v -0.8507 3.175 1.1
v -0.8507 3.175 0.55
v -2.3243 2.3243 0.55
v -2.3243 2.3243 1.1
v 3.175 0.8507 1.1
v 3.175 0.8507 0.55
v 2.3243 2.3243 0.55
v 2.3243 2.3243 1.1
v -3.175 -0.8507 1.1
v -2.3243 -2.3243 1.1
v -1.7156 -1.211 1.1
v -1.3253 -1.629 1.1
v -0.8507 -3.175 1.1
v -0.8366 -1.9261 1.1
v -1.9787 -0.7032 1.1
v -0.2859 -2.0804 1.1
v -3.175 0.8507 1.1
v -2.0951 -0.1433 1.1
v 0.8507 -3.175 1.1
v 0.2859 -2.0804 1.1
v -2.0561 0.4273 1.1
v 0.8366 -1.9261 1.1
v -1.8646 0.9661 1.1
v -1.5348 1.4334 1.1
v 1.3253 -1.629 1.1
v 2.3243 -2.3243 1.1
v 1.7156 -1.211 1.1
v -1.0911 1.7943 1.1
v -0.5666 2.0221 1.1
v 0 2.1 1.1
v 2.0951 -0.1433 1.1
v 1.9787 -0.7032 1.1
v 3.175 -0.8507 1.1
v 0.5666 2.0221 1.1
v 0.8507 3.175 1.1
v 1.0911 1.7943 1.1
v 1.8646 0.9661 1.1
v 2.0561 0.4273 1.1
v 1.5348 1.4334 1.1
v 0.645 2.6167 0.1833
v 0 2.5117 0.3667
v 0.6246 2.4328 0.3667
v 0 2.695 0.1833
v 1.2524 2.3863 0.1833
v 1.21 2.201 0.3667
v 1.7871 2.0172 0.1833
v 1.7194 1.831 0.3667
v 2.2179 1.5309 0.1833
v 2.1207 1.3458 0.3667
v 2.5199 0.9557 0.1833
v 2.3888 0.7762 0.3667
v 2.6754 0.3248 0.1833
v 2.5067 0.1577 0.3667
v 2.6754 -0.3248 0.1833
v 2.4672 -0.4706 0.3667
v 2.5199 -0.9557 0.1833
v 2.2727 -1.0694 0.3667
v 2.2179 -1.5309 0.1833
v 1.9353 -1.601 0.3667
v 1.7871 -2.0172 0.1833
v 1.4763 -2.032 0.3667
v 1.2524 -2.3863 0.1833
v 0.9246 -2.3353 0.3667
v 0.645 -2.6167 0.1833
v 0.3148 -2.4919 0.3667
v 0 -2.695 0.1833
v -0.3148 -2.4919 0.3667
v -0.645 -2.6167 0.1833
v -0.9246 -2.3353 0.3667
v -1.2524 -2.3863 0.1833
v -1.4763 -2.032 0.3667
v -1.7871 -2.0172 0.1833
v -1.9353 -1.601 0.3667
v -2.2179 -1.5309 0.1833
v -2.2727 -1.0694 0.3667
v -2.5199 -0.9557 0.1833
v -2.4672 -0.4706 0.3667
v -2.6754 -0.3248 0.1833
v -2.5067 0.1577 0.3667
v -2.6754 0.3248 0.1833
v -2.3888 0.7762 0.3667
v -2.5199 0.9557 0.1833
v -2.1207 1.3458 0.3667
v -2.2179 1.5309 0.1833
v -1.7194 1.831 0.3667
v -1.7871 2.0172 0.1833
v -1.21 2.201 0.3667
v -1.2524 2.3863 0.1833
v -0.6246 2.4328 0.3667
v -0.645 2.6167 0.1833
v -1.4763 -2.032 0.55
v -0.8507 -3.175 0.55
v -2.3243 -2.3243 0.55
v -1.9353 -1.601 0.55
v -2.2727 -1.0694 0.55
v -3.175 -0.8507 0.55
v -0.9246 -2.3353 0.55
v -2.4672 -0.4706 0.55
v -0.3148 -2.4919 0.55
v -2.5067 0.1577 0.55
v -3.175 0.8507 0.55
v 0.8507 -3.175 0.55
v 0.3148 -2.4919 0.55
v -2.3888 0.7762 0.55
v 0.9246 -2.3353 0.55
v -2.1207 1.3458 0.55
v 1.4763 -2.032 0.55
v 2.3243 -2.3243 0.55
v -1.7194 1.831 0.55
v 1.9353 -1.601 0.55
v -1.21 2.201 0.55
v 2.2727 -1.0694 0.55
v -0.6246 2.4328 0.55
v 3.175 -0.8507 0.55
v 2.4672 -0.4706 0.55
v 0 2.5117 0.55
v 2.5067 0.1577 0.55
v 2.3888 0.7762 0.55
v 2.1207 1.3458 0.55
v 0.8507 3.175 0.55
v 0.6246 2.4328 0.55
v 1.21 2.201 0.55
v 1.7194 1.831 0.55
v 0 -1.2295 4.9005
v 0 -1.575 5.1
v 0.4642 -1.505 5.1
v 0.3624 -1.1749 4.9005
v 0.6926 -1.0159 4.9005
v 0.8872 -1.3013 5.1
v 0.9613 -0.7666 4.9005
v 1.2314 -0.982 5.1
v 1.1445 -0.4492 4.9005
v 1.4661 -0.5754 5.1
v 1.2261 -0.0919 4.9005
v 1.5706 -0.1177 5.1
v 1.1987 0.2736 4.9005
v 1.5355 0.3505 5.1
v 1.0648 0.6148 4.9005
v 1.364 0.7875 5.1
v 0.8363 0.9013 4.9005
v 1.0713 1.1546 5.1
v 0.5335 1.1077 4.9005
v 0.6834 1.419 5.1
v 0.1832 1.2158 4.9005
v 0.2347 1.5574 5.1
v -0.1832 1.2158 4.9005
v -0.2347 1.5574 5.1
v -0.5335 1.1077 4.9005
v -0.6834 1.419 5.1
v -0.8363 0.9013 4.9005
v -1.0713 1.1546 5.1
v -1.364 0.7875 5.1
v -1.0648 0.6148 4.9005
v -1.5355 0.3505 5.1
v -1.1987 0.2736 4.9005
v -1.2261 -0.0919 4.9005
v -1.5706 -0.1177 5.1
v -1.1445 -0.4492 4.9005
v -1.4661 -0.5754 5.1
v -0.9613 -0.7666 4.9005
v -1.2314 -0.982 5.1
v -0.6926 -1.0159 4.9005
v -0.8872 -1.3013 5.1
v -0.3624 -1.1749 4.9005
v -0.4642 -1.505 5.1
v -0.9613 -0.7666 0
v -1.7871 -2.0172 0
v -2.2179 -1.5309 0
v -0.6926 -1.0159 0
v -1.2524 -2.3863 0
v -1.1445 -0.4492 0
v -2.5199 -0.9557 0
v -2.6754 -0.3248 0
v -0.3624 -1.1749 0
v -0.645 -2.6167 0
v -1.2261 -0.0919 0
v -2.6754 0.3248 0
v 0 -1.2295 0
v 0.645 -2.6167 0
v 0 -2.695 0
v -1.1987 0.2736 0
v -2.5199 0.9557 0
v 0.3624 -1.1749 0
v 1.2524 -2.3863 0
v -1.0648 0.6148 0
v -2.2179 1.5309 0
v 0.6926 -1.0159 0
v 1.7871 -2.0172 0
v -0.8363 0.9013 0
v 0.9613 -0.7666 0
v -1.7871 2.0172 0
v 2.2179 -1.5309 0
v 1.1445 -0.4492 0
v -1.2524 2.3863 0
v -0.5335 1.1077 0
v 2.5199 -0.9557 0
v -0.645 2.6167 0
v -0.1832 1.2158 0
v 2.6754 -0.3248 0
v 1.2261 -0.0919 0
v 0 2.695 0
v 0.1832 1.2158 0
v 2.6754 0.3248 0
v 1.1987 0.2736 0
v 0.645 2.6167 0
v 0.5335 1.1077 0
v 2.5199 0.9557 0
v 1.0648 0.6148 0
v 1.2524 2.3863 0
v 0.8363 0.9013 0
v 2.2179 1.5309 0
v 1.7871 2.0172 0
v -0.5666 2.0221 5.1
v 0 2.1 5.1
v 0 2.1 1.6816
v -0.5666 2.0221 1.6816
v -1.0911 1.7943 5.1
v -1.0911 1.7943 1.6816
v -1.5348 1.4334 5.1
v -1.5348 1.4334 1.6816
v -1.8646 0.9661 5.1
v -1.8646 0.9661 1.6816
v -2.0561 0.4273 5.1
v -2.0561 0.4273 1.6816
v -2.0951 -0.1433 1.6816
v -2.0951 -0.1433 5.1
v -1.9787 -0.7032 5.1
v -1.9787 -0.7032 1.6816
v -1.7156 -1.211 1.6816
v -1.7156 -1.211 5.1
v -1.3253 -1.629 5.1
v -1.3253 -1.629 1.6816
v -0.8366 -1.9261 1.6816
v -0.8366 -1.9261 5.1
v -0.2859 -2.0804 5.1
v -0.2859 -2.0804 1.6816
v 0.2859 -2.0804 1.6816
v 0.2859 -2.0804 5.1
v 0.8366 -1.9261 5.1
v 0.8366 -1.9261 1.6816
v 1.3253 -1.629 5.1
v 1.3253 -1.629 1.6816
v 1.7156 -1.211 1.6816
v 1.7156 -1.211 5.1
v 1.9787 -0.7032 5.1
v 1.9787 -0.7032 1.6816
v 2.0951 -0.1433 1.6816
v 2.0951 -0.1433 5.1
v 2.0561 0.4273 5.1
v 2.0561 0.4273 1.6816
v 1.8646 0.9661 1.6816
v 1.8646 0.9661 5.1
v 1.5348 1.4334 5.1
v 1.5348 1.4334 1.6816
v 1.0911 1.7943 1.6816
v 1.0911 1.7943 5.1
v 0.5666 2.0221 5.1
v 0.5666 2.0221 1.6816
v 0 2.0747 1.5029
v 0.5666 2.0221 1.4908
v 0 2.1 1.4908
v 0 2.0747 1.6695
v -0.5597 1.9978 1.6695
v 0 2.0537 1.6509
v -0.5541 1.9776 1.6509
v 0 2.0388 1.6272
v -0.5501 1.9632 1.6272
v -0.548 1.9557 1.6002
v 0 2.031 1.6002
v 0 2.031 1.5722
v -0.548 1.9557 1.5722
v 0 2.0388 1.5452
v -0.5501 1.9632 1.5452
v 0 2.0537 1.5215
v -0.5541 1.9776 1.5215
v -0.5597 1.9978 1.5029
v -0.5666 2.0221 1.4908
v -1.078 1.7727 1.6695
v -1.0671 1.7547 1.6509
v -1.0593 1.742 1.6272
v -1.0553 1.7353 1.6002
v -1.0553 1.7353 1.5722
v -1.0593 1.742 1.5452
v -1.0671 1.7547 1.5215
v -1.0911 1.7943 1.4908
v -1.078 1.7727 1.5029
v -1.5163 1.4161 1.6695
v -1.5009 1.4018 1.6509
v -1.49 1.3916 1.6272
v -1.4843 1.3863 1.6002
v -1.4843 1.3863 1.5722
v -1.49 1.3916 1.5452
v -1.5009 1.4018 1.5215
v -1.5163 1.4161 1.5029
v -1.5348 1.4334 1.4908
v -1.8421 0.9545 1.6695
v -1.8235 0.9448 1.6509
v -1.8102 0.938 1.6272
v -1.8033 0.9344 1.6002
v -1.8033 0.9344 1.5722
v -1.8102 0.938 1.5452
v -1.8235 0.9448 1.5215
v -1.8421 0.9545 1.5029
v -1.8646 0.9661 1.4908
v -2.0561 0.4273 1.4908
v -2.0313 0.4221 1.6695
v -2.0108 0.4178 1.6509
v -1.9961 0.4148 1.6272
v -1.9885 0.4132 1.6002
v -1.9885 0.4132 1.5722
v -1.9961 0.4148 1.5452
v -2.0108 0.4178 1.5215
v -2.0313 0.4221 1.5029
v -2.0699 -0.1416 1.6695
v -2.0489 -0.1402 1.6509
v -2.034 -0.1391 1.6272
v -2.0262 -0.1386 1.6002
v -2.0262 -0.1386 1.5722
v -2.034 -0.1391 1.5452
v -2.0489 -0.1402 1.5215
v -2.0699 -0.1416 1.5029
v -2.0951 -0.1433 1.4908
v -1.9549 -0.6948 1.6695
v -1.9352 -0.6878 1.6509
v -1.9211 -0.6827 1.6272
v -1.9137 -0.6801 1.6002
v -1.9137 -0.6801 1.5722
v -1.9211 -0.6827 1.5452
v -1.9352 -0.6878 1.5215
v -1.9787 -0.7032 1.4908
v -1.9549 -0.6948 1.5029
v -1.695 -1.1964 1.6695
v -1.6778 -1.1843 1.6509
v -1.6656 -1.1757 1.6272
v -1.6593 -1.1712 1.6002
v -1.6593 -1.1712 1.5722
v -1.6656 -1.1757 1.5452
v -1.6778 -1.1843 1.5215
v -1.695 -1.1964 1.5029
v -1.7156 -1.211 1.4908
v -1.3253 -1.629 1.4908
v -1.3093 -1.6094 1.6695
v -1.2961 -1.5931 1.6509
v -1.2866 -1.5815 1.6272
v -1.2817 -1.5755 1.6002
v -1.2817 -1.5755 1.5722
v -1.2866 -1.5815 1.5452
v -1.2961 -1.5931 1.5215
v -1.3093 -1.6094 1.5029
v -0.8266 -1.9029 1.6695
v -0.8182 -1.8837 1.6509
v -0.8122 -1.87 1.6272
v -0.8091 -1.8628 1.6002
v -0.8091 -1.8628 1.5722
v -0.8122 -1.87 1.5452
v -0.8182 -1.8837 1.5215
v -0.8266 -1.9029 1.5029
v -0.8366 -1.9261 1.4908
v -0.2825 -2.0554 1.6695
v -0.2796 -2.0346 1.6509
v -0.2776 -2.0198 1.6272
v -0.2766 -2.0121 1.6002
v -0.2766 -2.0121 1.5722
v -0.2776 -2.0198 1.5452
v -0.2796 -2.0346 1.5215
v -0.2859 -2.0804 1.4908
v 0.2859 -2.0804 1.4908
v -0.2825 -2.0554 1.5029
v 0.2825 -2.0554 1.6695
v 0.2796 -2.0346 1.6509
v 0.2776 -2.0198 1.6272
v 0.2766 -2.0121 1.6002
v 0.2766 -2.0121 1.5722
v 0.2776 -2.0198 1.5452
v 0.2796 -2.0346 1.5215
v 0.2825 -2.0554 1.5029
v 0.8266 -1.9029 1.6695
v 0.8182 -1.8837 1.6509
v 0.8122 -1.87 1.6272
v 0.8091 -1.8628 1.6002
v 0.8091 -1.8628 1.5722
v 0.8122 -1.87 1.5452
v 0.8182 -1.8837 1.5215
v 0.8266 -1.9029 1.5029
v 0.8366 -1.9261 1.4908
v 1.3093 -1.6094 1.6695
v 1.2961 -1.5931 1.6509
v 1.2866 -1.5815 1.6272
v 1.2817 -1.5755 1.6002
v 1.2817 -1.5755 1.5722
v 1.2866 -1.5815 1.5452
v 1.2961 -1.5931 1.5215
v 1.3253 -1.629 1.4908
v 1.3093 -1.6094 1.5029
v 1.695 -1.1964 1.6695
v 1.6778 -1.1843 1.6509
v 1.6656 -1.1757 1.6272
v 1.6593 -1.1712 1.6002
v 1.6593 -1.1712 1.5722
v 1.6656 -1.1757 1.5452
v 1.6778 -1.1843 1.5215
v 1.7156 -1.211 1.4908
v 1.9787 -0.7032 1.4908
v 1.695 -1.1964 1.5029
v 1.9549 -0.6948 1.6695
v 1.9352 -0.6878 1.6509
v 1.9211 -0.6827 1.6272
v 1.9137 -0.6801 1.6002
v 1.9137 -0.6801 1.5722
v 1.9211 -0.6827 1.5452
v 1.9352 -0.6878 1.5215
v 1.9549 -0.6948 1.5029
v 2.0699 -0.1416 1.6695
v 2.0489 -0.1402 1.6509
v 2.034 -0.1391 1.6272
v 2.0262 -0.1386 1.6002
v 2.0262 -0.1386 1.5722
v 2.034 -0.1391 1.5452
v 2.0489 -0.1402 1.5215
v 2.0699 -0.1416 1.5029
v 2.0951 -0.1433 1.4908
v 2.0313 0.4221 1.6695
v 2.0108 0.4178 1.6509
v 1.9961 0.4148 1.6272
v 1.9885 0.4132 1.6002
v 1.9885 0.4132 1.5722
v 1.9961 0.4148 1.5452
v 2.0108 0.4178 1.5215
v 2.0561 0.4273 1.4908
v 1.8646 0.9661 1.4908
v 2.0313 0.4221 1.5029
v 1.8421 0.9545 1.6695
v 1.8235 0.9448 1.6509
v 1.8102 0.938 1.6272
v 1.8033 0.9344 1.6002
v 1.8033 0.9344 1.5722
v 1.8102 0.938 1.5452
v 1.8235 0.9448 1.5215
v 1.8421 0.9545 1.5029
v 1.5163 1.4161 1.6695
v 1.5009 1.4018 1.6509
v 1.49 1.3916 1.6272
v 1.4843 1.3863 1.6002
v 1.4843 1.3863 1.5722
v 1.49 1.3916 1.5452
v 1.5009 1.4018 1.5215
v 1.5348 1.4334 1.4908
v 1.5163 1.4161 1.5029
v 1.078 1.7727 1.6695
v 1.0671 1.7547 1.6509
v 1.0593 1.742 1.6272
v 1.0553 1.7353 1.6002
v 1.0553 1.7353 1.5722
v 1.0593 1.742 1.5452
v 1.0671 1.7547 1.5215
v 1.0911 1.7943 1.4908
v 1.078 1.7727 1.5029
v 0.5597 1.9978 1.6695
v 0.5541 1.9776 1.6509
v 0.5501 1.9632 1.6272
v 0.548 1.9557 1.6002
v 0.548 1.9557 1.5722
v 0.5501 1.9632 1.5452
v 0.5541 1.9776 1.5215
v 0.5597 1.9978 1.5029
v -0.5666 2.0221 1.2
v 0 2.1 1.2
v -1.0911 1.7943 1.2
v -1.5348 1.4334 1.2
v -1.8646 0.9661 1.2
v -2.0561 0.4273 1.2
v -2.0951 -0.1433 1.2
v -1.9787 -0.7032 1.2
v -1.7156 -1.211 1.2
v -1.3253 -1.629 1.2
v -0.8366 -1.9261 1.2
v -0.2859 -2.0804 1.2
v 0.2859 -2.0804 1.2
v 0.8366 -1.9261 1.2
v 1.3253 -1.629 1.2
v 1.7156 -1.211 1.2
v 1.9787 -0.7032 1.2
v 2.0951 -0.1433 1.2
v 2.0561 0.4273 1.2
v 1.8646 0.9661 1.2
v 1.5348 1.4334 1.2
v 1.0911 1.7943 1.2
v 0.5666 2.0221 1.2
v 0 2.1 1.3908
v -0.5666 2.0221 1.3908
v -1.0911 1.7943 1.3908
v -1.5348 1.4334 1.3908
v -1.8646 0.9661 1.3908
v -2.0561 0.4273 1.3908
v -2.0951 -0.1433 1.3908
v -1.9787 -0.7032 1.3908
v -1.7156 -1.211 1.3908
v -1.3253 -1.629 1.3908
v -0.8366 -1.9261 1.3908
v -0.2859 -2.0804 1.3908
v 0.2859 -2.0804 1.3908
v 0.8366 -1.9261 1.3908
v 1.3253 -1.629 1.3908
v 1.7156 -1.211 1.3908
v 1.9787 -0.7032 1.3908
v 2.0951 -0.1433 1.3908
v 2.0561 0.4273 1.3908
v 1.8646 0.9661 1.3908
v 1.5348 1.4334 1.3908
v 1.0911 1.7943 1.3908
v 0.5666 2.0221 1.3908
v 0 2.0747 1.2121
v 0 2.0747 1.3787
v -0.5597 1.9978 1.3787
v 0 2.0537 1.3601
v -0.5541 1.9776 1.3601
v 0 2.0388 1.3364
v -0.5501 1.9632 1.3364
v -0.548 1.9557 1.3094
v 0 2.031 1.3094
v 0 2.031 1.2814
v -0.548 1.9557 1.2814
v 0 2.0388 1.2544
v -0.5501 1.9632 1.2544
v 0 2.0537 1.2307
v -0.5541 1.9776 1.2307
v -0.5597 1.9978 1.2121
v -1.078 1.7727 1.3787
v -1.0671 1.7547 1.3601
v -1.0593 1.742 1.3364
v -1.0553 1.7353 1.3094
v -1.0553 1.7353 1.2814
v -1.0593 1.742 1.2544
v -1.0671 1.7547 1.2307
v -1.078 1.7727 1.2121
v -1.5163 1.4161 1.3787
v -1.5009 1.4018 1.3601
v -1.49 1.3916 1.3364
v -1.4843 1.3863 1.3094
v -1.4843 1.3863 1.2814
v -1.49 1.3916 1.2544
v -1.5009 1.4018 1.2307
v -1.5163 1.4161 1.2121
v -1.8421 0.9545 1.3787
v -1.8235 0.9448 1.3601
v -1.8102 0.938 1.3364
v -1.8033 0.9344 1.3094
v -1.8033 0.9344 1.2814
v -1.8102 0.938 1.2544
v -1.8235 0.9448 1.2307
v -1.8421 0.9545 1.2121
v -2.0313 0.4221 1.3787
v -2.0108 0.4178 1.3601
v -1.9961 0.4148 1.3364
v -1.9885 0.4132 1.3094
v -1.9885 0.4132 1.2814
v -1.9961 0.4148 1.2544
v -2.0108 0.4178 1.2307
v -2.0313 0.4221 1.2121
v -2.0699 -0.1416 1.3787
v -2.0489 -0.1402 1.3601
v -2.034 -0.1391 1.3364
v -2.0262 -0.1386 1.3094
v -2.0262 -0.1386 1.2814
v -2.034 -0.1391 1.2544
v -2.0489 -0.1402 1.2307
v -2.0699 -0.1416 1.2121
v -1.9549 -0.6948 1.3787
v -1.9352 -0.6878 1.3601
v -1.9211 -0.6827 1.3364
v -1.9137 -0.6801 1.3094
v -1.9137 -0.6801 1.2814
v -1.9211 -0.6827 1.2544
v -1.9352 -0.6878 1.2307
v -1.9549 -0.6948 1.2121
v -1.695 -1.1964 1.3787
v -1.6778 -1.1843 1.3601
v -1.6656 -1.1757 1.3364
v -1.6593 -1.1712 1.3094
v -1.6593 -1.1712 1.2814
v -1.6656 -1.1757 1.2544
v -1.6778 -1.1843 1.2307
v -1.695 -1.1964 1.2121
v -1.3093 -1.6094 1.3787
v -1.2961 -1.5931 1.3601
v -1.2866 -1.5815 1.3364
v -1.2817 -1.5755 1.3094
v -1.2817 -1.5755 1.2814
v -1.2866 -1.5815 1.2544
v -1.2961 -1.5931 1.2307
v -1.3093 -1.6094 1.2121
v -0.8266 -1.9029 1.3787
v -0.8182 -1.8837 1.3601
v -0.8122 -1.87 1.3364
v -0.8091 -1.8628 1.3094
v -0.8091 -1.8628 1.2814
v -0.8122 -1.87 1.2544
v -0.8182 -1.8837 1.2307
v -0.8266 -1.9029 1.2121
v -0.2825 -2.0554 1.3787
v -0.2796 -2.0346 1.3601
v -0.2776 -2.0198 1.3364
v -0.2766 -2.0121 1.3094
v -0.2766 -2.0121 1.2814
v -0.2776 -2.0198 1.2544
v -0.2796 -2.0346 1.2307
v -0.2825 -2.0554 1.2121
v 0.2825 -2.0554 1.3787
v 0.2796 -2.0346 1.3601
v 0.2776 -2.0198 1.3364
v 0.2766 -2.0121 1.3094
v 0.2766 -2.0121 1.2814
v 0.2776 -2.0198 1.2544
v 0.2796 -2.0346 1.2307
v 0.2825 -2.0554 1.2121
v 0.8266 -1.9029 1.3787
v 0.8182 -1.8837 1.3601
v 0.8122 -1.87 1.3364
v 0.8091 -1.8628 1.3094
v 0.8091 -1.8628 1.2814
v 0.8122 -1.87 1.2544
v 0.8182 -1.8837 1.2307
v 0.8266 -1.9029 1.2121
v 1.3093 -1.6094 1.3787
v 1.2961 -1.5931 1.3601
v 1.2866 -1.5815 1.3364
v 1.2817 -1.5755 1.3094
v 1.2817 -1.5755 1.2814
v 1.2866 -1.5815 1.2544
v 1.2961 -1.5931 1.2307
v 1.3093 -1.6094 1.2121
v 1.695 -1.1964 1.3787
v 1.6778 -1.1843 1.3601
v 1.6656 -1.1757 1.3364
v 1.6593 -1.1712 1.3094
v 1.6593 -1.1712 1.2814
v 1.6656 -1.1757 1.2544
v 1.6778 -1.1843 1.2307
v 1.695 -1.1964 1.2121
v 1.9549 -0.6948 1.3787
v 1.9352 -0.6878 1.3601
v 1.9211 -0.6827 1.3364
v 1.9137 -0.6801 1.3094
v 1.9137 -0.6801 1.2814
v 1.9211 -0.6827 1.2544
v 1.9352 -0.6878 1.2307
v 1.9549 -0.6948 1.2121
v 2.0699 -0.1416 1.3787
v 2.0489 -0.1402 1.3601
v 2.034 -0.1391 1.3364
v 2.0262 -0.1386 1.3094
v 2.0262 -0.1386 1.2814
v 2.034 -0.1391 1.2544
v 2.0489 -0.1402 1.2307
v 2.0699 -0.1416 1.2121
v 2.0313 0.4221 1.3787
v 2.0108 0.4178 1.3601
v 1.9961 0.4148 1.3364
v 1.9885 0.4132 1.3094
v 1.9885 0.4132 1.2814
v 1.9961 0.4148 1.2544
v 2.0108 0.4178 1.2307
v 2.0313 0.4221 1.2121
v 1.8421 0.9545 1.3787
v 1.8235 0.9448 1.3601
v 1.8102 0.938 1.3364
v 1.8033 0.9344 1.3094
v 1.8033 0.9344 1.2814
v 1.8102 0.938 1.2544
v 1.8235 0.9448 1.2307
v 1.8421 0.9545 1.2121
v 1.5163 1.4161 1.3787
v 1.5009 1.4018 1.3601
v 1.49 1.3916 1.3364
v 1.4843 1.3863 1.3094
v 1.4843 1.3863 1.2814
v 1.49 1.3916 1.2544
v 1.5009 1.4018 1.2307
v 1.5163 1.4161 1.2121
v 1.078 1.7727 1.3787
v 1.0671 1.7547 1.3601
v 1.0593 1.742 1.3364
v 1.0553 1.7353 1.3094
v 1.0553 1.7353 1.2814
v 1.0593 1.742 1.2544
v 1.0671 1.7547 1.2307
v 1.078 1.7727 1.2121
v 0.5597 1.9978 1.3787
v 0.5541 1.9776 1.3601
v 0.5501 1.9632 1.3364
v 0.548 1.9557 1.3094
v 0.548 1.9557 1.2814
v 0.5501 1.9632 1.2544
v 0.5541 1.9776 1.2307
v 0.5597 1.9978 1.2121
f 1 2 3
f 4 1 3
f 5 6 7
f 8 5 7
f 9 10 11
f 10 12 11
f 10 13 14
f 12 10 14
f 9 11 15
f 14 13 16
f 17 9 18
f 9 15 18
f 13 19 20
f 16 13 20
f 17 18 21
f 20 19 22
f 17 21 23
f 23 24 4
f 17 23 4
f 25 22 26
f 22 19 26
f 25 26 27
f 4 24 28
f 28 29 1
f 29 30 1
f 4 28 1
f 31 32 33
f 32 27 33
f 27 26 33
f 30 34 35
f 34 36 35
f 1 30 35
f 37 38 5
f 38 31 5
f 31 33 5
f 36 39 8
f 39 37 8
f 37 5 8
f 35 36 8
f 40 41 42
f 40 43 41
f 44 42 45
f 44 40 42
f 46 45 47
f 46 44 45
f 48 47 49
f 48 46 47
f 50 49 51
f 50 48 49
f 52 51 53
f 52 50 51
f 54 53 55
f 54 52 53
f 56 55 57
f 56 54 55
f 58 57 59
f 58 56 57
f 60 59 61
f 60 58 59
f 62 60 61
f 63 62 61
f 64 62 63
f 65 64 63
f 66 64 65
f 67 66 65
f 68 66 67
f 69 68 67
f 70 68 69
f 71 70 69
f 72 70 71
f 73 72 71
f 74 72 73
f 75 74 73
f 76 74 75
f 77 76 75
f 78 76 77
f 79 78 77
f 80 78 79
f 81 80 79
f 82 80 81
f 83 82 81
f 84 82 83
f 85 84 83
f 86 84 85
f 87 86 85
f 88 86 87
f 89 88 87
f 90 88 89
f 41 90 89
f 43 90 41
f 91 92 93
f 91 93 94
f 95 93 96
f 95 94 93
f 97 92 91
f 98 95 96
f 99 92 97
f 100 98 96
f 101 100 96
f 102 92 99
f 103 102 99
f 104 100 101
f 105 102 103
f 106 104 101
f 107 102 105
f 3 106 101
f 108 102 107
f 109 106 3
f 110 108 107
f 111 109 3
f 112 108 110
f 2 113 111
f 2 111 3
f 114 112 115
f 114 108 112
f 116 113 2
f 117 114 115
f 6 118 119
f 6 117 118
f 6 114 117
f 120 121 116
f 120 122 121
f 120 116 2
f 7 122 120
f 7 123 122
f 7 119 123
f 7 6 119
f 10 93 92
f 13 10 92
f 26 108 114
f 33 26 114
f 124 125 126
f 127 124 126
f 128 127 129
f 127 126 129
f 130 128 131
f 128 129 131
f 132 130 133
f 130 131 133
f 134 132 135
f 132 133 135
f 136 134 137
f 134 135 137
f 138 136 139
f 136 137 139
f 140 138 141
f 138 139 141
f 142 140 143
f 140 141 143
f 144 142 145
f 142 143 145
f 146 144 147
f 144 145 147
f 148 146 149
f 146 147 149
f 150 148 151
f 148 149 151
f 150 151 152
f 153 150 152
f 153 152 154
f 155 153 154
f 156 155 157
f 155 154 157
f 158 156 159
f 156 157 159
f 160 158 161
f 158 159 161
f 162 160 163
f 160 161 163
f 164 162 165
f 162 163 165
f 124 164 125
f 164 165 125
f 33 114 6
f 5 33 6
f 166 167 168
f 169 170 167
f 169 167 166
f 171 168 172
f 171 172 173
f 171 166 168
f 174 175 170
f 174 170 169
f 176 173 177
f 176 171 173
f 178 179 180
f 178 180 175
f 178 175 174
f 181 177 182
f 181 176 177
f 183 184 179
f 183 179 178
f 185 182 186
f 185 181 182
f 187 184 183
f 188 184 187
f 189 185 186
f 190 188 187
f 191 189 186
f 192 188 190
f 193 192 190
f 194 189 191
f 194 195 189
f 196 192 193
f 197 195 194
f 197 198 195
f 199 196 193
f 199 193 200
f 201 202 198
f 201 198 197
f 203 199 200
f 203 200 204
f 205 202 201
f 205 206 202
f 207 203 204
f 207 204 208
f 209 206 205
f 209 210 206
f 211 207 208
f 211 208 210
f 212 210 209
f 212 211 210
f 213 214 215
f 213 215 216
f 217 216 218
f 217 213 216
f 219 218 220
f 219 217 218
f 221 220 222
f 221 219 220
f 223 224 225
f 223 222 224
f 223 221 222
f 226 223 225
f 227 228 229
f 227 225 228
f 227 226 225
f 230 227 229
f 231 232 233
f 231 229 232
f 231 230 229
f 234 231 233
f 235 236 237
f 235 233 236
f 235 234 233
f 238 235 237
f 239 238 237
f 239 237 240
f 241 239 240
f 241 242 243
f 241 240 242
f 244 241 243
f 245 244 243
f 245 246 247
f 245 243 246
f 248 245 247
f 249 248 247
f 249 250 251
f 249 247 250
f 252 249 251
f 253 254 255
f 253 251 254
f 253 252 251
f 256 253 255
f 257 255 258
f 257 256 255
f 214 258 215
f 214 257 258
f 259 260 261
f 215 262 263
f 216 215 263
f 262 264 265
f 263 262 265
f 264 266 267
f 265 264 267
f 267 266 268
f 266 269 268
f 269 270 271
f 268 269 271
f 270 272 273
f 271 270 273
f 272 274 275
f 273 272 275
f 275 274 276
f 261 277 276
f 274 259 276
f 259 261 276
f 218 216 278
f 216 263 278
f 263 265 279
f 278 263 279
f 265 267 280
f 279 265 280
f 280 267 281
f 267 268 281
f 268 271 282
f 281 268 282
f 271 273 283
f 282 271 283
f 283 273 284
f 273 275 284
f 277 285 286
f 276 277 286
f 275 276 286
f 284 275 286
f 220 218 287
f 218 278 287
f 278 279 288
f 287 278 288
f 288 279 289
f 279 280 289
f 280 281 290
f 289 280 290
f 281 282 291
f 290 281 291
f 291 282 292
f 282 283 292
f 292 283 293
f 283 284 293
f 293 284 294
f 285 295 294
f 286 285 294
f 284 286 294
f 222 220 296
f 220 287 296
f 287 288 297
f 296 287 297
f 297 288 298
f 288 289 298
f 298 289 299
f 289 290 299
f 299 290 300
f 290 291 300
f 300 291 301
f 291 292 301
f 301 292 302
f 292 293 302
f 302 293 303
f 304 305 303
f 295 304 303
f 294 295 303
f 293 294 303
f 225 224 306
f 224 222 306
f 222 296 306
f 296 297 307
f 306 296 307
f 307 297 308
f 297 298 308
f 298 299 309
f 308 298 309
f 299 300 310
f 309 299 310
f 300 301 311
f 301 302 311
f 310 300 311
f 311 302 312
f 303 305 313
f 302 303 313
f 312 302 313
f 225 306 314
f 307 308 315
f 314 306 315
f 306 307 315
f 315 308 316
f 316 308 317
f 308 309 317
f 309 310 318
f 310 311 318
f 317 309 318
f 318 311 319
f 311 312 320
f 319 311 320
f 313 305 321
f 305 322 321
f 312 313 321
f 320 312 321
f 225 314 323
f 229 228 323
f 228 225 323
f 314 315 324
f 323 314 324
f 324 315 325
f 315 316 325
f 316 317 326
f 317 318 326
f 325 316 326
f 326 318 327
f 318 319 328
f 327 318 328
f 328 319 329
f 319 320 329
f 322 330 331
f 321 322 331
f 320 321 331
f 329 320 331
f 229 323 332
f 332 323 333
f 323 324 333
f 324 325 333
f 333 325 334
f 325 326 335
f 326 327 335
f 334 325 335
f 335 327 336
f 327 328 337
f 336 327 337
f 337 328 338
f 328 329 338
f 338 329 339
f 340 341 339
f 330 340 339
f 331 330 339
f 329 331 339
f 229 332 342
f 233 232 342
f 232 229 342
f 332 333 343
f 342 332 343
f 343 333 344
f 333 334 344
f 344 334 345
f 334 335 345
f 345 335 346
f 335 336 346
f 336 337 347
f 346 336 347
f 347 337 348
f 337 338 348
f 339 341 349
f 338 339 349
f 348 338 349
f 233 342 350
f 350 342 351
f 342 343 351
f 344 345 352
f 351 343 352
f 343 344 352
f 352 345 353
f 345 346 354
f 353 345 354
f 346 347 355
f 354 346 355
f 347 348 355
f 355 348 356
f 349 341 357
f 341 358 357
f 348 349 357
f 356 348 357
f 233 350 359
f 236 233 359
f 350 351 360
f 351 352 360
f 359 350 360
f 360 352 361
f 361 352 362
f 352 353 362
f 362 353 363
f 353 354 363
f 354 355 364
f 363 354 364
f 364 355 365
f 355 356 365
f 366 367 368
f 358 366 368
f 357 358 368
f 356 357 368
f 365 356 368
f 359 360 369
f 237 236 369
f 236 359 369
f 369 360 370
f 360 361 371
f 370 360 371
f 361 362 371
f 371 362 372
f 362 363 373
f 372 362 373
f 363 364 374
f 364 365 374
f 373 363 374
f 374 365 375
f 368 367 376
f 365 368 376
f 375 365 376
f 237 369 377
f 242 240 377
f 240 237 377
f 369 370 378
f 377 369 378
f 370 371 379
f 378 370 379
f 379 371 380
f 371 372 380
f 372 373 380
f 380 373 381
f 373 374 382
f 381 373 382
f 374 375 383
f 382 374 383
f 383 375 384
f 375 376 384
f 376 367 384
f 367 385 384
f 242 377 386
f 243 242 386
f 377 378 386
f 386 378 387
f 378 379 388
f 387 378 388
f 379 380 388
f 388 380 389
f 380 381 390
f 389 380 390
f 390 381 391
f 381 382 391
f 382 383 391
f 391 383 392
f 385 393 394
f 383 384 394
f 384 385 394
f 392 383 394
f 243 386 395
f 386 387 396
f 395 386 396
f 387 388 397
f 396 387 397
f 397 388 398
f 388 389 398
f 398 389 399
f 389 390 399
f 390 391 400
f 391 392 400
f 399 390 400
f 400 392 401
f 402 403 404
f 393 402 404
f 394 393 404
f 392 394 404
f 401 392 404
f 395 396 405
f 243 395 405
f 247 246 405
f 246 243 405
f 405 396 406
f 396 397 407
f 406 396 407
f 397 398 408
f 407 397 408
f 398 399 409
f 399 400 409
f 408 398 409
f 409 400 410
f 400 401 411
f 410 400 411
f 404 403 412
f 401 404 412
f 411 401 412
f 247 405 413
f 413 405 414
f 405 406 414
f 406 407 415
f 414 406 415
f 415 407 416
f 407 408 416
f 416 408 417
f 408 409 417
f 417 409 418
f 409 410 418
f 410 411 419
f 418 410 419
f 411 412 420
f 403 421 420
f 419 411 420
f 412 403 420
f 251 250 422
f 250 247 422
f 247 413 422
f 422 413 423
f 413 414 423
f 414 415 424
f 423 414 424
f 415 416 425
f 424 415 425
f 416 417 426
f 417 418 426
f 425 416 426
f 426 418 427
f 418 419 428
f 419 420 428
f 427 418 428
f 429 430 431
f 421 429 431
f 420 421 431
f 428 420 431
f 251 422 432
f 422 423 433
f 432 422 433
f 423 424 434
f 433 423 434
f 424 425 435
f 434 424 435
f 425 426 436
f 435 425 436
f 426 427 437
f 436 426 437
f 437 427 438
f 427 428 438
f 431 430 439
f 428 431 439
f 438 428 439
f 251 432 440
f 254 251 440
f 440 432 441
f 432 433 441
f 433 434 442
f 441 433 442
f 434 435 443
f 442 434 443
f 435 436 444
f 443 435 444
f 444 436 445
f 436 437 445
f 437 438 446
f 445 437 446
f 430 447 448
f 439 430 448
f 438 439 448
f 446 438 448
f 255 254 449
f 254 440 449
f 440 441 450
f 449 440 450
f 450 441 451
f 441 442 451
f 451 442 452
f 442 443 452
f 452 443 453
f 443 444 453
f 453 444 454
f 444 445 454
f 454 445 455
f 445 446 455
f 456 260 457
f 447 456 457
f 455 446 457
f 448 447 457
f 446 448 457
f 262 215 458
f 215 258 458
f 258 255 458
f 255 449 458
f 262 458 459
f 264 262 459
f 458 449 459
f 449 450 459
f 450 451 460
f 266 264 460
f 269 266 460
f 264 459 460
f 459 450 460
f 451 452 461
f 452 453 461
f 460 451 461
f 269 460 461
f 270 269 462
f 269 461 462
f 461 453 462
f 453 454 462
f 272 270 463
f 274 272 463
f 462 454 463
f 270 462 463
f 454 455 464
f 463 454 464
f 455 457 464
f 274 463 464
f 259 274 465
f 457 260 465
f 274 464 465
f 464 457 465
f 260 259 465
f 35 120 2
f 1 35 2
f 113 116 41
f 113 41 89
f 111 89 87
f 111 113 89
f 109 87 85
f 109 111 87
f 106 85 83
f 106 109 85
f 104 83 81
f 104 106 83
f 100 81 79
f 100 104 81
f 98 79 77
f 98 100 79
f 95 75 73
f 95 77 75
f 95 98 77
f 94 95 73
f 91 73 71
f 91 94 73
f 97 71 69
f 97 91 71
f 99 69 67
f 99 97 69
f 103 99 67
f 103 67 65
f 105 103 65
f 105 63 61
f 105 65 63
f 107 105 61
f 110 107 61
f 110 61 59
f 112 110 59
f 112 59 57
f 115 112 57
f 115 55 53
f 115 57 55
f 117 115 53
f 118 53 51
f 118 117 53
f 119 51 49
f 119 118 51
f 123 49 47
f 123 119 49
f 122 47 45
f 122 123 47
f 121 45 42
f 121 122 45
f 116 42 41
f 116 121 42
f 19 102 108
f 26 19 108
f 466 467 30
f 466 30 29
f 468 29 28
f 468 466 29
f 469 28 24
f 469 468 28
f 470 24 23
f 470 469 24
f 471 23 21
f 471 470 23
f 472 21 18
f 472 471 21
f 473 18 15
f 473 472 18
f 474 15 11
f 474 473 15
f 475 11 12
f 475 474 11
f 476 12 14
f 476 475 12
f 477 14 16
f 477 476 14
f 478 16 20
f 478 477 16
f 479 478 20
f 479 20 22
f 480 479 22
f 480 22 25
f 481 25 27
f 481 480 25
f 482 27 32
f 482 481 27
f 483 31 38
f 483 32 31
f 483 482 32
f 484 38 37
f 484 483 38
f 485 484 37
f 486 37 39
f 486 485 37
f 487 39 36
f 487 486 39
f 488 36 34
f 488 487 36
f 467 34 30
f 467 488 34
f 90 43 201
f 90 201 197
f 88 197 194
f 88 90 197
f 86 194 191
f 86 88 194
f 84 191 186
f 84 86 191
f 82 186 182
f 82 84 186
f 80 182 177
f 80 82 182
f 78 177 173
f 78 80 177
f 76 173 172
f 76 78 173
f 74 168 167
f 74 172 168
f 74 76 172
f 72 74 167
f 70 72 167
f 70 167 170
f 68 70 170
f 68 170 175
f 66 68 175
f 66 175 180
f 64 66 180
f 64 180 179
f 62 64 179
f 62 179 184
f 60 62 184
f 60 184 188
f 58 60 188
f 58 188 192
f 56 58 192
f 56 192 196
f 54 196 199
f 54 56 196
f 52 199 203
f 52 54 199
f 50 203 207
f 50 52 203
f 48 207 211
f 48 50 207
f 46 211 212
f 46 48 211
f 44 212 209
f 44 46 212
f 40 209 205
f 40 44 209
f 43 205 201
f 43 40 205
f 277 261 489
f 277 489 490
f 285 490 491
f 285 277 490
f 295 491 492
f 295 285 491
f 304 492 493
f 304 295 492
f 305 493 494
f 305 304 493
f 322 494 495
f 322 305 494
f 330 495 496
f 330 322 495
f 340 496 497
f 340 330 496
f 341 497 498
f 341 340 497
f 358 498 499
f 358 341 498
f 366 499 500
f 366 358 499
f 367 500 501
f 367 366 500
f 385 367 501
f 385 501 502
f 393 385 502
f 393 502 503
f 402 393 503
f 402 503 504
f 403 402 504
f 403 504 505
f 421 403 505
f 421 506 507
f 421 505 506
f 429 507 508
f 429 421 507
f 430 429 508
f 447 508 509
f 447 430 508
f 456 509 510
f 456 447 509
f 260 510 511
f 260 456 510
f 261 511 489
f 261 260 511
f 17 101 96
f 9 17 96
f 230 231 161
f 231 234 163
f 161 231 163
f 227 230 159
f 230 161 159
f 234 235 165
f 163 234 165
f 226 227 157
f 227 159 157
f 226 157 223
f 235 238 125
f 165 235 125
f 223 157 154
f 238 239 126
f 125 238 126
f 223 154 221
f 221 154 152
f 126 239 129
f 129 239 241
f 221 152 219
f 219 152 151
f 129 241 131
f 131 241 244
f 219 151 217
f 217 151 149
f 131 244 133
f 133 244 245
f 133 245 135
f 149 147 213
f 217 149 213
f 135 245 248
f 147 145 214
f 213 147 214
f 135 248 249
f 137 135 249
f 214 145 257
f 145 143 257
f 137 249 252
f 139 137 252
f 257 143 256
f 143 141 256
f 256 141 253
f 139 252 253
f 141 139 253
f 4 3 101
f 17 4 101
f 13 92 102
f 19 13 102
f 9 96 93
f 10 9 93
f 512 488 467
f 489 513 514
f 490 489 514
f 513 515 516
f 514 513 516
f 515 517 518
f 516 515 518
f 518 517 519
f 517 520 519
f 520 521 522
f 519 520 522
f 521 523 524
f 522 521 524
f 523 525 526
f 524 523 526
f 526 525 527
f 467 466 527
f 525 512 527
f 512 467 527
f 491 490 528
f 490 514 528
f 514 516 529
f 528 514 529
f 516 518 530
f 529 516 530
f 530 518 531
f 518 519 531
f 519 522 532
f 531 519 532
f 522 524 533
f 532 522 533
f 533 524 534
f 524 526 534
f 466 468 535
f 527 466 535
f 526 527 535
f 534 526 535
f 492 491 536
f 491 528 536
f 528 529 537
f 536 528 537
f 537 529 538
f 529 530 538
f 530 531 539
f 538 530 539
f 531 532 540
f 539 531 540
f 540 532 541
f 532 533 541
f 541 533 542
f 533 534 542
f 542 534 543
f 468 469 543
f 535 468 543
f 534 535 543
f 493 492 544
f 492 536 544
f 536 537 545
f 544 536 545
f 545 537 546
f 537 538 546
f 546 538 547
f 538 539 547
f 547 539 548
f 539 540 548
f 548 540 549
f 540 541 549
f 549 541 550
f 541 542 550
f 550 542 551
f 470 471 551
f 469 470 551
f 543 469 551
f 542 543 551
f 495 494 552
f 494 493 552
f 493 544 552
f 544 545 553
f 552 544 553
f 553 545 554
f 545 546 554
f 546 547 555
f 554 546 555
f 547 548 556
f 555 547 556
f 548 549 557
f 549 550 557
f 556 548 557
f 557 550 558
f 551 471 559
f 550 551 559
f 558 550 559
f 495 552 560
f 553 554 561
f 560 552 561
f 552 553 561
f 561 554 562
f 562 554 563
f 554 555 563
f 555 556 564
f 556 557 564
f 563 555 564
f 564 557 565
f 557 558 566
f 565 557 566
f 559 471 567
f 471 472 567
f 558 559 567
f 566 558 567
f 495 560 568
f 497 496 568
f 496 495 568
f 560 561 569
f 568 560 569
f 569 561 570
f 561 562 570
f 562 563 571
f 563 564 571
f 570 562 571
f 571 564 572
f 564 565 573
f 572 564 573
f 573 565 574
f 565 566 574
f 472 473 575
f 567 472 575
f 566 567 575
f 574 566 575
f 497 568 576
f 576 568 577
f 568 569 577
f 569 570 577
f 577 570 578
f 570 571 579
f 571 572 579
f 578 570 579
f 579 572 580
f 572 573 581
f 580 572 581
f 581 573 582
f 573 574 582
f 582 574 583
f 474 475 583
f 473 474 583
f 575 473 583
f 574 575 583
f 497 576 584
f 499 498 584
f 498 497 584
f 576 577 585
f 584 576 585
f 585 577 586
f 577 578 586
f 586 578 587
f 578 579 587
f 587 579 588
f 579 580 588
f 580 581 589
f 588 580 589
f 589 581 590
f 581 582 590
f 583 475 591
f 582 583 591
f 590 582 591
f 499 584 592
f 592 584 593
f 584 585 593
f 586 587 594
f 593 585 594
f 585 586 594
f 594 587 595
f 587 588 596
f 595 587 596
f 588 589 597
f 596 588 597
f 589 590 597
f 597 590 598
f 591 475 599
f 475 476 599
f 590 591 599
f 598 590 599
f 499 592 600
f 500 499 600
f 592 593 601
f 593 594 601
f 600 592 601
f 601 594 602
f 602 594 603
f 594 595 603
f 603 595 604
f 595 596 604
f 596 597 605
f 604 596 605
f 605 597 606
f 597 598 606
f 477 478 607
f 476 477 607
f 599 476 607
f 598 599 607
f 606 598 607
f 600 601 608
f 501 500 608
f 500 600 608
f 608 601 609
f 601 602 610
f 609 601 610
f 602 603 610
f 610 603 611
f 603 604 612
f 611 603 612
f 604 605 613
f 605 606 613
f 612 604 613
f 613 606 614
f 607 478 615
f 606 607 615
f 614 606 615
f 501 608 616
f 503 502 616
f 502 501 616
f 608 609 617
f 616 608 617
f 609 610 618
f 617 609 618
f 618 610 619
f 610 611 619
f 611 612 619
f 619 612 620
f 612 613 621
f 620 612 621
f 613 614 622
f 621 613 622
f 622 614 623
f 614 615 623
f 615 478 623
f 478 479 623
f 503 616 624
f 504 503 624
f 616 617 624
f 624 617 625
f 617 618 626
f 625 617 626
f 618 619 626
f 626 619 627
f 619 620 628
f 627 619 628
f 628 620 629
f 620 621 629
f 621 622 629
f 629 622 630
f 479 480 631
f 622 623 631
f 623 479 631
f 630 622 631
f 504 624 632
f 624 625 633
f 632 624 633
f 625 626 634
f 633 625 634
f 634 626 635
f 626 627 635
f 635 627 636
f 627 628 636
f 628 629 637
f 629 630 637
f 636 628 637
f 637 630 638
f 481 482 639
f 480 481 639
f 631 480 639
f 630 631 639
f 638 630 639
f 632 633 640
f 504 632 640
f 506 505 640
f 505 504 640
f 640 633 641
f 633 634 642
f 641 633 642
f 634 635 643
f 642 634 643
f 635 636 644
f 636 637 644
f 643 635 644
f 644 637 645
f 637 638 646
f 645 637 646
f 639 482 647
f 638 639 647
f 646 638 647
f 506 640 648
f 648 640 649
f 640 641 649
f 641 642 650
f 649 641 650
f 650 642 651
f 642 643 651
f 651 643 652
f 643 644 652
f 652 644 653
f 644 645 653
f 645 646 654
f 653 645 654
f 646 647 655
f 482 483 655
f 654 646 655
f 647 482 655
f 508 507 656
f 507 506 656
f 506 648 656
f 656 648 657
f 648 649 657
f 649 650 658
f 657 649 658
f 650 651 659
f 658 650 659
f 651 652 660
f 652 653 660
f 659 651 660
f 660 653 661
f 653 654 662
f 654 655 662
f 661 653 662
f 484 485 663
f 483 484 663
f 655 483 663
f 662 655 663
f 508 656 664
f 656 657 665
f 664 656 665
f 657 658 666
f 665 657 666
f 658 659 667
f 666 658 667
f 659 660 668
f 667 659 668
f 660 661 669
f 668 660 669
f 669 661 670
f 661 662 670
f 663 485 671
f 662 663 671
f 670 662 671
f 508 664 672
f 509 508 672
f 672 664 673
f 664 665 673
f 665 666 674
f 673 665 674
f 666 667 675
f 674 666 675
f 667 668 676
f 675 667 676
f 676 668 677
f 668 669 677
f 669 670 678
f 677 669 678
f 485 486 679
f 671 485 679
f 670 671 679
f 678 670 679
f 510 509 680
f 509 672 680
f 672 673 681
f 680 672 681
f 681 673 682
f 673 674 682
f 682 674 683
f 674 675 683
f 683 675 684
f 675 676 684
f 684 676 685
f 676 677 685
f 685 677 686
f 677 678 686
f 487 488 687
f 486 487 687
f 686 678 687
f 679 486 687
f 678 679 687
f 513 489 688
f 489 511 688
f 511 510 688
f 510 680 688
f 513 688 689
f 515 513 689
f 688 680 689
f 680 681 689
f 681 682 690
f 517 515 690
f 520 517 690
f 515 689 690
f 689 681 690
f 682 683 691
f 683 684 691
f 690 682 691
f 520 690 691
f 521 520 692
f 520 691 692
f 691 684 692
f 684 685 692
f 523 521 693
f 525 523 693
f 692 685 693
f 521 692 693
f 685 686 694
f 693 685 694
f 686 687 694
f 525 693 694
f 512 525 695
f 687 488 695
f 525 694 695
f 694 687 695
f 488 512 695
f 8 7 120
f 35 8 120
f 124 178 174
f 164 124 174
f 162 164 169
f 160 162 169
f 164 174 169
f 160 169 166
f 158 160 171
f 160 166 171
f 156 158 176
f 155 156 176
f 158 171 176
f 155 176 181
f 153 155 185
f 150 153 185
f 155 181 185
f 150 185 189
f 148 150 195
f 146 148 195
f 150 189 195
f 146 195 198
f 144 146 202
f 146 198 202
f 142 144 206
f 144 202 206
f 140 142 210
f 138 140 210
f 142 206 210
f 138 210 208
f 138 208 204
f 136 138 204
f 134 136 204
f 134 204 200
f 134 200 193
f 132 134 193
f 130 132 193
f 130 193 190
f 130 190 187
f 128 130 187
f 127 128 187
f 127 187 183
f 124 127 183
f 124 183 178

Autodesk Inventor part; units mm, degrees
ref_plane "YZ Plane" through (0, 0, 0) normal (1, 0, 0) x (0, 1, 0)
ref_plane "XZ Plane" through (0, 0, 0) normal (0, 1, 0) x (-1, 0, 0)
ref_plane "XY Plane" through (0, 0, 0) normal (0, 0, 1) x (1, 0, 0)
sketch "Sketch1" plane through (0, 0, 0) normal (1, 0, 0) x (0, 1, 0)
  line L0 (0, 0) -> (2.695, 0)
  line L1 (2.695, 0) -> (2.695, 0.1833)
  line L2 (2.695, 0.1833) -> (2.5117, 0.3667)
  line L3 (2.5117, 0.3667) -> (2.5117, 0.55)
  line L4 (2.5117, 0.55) -> (4.7625, 0.55)
  line L5 (4.7625, 0.55) -> (4.7625, 1.1)
  line L6 (4.7625, 1.1) -> (2.1, 1.1)
  line L7 (2.1, 1.1) -> (2.1, 1.2)
  arc A0 (2.1, 1.3908) -> (2.1, 1.2) centre (2.13, 1.2954) ccw
  line L8 (2.1, 1.6816) -> (2.1, 5.1)
  line L9 (2.1, 5.1) -> (0, 5.1)
  line L10 (0, 5.1) -> (0, 0)
  arc A1 (2.1, 1.6816) -> (2.1, 1.4908) centre (2.13, 1.5862) ccw
  line L11 (2.1, 1.3908) -> (2.1, 1.4908)
  dimension "d0" = 5.39
  dimension "d1" = 1.1
  dimension "d2" = 4.2
  dimension "d3" = 9.525
  dimension "d4" = 4
  dimension "d5" = 0.1
  dimension "d6" = 0.55
  dimension "d7" = 0.1833
  dimension "d8" = 0.1833
  dimension "d9" = 0.1833
  dimension "d10" = 0.03
  dimension "d11" = 0.1
  dimension "d12" = 0.1
revolve "Revolution1" add sketch "Sketch1" angle 360 about axis through (0, 0, 5.1) along (0, 0, -1)
sketch "Sketch2" plane through (0, 0, 0.55) normal (0, 0, -1) x (-1, 0, 0)
  line L0 (0.8507, 3.175) -> (2.3243, 2.3243)
  line L1 (2.3243, 2.3243) -> (3.175, 0.8507)
  line L2 (3.175, 0.8507) -> (3.175, -0.8507)
  line L3 (3.175, -0.8507) -> (2.3243, -2.3243)
  line L4 (2.3243, -2.3243) -> (0.8507, -3.175)
  line L5 (0.8507, -3.175) -> (-0.8507, -3.175)
  line L6 (-0.8507, -3.175) -> (-2.3243, -2.3243)
  line L7 (-2.3243, -2.3243) -> (-3.175, -0.8507)
  line L8 (-3.175, -0.8507) -> (-3.175, 0.8507)
  line L9 (-3.175, 0.8507) -> (-2.3243, 2.3243)
  line L10 (-2.3243, 2.3243) -> (-0.8507, 3.175)
  line L11 (-0.8507, 3.175) -> (0.8507, 3.175)
  circle A0 centre (0, 0) radius 4.7625 projected
  dimension "d16" = 6.35
extrude "Extrusion1" cut sketch "Sketch2" against normal through all
hole "Hole1" at (0, 0, 5.1) direction (0, 0, -1) diameter 2.459 end through all countersink diameter 3.15 countersink angle 120 thread size "M3x0.5" class "6H" standard "ANSI Metric M Profile"
hole "Hole2" [suppressed]
equation "\"d0\" = C_"
equation "\"d1\" = A_"
equation "\"d2\" = B"
equation "\"d3\" = 1.5 * H_"
equation "\"d4\" = Length_Code"
equation "\"d5\" = Mark_1"
equation "\"d6\" = 0.5 * A_"
equation "\"d7\" = 0.166667 * A_"
equation "\"d8\" = 0.166667 * A_"
equation "\"d9\" = 0.166667 * A_"
equation "\"d10\" = Mark_2"
equation "\"d11\" = Mark_1"
equation "\"d12\" = Mark_1"
equation "\"d13\" = T_"
equation "\"d14\" = 1.05 * Thread"
equation "\"d53\" = Length_Code"
equation "\"d18\" = 1.05 * Thread"
equation "\"d20\" = T_"
equation "\"d16\" = H_"
equation "\"Length_Code\" = 4"
equation "\"T_\" = 4"
equation "\"A_\" = 1.1"
equation "\"B\" = 4.2"
equation "\"C_\" = 5.39"
equation "\"H_\" = 6.35"
equation "\"Mark_1\" = 0.1"
equation "\"Mark_2\" = 0.03"
equation "\"Thread\" = 3"
equation "\"Min_Thick\" = 1.6"
equation "\"B_Hole\" = 5.41"
equation "\"Min_Depht\" = 1.1"
equation "\"Min_Dist\" = 4.8"
properties part number "CSS-M3-4" material "Stainless Steel"
